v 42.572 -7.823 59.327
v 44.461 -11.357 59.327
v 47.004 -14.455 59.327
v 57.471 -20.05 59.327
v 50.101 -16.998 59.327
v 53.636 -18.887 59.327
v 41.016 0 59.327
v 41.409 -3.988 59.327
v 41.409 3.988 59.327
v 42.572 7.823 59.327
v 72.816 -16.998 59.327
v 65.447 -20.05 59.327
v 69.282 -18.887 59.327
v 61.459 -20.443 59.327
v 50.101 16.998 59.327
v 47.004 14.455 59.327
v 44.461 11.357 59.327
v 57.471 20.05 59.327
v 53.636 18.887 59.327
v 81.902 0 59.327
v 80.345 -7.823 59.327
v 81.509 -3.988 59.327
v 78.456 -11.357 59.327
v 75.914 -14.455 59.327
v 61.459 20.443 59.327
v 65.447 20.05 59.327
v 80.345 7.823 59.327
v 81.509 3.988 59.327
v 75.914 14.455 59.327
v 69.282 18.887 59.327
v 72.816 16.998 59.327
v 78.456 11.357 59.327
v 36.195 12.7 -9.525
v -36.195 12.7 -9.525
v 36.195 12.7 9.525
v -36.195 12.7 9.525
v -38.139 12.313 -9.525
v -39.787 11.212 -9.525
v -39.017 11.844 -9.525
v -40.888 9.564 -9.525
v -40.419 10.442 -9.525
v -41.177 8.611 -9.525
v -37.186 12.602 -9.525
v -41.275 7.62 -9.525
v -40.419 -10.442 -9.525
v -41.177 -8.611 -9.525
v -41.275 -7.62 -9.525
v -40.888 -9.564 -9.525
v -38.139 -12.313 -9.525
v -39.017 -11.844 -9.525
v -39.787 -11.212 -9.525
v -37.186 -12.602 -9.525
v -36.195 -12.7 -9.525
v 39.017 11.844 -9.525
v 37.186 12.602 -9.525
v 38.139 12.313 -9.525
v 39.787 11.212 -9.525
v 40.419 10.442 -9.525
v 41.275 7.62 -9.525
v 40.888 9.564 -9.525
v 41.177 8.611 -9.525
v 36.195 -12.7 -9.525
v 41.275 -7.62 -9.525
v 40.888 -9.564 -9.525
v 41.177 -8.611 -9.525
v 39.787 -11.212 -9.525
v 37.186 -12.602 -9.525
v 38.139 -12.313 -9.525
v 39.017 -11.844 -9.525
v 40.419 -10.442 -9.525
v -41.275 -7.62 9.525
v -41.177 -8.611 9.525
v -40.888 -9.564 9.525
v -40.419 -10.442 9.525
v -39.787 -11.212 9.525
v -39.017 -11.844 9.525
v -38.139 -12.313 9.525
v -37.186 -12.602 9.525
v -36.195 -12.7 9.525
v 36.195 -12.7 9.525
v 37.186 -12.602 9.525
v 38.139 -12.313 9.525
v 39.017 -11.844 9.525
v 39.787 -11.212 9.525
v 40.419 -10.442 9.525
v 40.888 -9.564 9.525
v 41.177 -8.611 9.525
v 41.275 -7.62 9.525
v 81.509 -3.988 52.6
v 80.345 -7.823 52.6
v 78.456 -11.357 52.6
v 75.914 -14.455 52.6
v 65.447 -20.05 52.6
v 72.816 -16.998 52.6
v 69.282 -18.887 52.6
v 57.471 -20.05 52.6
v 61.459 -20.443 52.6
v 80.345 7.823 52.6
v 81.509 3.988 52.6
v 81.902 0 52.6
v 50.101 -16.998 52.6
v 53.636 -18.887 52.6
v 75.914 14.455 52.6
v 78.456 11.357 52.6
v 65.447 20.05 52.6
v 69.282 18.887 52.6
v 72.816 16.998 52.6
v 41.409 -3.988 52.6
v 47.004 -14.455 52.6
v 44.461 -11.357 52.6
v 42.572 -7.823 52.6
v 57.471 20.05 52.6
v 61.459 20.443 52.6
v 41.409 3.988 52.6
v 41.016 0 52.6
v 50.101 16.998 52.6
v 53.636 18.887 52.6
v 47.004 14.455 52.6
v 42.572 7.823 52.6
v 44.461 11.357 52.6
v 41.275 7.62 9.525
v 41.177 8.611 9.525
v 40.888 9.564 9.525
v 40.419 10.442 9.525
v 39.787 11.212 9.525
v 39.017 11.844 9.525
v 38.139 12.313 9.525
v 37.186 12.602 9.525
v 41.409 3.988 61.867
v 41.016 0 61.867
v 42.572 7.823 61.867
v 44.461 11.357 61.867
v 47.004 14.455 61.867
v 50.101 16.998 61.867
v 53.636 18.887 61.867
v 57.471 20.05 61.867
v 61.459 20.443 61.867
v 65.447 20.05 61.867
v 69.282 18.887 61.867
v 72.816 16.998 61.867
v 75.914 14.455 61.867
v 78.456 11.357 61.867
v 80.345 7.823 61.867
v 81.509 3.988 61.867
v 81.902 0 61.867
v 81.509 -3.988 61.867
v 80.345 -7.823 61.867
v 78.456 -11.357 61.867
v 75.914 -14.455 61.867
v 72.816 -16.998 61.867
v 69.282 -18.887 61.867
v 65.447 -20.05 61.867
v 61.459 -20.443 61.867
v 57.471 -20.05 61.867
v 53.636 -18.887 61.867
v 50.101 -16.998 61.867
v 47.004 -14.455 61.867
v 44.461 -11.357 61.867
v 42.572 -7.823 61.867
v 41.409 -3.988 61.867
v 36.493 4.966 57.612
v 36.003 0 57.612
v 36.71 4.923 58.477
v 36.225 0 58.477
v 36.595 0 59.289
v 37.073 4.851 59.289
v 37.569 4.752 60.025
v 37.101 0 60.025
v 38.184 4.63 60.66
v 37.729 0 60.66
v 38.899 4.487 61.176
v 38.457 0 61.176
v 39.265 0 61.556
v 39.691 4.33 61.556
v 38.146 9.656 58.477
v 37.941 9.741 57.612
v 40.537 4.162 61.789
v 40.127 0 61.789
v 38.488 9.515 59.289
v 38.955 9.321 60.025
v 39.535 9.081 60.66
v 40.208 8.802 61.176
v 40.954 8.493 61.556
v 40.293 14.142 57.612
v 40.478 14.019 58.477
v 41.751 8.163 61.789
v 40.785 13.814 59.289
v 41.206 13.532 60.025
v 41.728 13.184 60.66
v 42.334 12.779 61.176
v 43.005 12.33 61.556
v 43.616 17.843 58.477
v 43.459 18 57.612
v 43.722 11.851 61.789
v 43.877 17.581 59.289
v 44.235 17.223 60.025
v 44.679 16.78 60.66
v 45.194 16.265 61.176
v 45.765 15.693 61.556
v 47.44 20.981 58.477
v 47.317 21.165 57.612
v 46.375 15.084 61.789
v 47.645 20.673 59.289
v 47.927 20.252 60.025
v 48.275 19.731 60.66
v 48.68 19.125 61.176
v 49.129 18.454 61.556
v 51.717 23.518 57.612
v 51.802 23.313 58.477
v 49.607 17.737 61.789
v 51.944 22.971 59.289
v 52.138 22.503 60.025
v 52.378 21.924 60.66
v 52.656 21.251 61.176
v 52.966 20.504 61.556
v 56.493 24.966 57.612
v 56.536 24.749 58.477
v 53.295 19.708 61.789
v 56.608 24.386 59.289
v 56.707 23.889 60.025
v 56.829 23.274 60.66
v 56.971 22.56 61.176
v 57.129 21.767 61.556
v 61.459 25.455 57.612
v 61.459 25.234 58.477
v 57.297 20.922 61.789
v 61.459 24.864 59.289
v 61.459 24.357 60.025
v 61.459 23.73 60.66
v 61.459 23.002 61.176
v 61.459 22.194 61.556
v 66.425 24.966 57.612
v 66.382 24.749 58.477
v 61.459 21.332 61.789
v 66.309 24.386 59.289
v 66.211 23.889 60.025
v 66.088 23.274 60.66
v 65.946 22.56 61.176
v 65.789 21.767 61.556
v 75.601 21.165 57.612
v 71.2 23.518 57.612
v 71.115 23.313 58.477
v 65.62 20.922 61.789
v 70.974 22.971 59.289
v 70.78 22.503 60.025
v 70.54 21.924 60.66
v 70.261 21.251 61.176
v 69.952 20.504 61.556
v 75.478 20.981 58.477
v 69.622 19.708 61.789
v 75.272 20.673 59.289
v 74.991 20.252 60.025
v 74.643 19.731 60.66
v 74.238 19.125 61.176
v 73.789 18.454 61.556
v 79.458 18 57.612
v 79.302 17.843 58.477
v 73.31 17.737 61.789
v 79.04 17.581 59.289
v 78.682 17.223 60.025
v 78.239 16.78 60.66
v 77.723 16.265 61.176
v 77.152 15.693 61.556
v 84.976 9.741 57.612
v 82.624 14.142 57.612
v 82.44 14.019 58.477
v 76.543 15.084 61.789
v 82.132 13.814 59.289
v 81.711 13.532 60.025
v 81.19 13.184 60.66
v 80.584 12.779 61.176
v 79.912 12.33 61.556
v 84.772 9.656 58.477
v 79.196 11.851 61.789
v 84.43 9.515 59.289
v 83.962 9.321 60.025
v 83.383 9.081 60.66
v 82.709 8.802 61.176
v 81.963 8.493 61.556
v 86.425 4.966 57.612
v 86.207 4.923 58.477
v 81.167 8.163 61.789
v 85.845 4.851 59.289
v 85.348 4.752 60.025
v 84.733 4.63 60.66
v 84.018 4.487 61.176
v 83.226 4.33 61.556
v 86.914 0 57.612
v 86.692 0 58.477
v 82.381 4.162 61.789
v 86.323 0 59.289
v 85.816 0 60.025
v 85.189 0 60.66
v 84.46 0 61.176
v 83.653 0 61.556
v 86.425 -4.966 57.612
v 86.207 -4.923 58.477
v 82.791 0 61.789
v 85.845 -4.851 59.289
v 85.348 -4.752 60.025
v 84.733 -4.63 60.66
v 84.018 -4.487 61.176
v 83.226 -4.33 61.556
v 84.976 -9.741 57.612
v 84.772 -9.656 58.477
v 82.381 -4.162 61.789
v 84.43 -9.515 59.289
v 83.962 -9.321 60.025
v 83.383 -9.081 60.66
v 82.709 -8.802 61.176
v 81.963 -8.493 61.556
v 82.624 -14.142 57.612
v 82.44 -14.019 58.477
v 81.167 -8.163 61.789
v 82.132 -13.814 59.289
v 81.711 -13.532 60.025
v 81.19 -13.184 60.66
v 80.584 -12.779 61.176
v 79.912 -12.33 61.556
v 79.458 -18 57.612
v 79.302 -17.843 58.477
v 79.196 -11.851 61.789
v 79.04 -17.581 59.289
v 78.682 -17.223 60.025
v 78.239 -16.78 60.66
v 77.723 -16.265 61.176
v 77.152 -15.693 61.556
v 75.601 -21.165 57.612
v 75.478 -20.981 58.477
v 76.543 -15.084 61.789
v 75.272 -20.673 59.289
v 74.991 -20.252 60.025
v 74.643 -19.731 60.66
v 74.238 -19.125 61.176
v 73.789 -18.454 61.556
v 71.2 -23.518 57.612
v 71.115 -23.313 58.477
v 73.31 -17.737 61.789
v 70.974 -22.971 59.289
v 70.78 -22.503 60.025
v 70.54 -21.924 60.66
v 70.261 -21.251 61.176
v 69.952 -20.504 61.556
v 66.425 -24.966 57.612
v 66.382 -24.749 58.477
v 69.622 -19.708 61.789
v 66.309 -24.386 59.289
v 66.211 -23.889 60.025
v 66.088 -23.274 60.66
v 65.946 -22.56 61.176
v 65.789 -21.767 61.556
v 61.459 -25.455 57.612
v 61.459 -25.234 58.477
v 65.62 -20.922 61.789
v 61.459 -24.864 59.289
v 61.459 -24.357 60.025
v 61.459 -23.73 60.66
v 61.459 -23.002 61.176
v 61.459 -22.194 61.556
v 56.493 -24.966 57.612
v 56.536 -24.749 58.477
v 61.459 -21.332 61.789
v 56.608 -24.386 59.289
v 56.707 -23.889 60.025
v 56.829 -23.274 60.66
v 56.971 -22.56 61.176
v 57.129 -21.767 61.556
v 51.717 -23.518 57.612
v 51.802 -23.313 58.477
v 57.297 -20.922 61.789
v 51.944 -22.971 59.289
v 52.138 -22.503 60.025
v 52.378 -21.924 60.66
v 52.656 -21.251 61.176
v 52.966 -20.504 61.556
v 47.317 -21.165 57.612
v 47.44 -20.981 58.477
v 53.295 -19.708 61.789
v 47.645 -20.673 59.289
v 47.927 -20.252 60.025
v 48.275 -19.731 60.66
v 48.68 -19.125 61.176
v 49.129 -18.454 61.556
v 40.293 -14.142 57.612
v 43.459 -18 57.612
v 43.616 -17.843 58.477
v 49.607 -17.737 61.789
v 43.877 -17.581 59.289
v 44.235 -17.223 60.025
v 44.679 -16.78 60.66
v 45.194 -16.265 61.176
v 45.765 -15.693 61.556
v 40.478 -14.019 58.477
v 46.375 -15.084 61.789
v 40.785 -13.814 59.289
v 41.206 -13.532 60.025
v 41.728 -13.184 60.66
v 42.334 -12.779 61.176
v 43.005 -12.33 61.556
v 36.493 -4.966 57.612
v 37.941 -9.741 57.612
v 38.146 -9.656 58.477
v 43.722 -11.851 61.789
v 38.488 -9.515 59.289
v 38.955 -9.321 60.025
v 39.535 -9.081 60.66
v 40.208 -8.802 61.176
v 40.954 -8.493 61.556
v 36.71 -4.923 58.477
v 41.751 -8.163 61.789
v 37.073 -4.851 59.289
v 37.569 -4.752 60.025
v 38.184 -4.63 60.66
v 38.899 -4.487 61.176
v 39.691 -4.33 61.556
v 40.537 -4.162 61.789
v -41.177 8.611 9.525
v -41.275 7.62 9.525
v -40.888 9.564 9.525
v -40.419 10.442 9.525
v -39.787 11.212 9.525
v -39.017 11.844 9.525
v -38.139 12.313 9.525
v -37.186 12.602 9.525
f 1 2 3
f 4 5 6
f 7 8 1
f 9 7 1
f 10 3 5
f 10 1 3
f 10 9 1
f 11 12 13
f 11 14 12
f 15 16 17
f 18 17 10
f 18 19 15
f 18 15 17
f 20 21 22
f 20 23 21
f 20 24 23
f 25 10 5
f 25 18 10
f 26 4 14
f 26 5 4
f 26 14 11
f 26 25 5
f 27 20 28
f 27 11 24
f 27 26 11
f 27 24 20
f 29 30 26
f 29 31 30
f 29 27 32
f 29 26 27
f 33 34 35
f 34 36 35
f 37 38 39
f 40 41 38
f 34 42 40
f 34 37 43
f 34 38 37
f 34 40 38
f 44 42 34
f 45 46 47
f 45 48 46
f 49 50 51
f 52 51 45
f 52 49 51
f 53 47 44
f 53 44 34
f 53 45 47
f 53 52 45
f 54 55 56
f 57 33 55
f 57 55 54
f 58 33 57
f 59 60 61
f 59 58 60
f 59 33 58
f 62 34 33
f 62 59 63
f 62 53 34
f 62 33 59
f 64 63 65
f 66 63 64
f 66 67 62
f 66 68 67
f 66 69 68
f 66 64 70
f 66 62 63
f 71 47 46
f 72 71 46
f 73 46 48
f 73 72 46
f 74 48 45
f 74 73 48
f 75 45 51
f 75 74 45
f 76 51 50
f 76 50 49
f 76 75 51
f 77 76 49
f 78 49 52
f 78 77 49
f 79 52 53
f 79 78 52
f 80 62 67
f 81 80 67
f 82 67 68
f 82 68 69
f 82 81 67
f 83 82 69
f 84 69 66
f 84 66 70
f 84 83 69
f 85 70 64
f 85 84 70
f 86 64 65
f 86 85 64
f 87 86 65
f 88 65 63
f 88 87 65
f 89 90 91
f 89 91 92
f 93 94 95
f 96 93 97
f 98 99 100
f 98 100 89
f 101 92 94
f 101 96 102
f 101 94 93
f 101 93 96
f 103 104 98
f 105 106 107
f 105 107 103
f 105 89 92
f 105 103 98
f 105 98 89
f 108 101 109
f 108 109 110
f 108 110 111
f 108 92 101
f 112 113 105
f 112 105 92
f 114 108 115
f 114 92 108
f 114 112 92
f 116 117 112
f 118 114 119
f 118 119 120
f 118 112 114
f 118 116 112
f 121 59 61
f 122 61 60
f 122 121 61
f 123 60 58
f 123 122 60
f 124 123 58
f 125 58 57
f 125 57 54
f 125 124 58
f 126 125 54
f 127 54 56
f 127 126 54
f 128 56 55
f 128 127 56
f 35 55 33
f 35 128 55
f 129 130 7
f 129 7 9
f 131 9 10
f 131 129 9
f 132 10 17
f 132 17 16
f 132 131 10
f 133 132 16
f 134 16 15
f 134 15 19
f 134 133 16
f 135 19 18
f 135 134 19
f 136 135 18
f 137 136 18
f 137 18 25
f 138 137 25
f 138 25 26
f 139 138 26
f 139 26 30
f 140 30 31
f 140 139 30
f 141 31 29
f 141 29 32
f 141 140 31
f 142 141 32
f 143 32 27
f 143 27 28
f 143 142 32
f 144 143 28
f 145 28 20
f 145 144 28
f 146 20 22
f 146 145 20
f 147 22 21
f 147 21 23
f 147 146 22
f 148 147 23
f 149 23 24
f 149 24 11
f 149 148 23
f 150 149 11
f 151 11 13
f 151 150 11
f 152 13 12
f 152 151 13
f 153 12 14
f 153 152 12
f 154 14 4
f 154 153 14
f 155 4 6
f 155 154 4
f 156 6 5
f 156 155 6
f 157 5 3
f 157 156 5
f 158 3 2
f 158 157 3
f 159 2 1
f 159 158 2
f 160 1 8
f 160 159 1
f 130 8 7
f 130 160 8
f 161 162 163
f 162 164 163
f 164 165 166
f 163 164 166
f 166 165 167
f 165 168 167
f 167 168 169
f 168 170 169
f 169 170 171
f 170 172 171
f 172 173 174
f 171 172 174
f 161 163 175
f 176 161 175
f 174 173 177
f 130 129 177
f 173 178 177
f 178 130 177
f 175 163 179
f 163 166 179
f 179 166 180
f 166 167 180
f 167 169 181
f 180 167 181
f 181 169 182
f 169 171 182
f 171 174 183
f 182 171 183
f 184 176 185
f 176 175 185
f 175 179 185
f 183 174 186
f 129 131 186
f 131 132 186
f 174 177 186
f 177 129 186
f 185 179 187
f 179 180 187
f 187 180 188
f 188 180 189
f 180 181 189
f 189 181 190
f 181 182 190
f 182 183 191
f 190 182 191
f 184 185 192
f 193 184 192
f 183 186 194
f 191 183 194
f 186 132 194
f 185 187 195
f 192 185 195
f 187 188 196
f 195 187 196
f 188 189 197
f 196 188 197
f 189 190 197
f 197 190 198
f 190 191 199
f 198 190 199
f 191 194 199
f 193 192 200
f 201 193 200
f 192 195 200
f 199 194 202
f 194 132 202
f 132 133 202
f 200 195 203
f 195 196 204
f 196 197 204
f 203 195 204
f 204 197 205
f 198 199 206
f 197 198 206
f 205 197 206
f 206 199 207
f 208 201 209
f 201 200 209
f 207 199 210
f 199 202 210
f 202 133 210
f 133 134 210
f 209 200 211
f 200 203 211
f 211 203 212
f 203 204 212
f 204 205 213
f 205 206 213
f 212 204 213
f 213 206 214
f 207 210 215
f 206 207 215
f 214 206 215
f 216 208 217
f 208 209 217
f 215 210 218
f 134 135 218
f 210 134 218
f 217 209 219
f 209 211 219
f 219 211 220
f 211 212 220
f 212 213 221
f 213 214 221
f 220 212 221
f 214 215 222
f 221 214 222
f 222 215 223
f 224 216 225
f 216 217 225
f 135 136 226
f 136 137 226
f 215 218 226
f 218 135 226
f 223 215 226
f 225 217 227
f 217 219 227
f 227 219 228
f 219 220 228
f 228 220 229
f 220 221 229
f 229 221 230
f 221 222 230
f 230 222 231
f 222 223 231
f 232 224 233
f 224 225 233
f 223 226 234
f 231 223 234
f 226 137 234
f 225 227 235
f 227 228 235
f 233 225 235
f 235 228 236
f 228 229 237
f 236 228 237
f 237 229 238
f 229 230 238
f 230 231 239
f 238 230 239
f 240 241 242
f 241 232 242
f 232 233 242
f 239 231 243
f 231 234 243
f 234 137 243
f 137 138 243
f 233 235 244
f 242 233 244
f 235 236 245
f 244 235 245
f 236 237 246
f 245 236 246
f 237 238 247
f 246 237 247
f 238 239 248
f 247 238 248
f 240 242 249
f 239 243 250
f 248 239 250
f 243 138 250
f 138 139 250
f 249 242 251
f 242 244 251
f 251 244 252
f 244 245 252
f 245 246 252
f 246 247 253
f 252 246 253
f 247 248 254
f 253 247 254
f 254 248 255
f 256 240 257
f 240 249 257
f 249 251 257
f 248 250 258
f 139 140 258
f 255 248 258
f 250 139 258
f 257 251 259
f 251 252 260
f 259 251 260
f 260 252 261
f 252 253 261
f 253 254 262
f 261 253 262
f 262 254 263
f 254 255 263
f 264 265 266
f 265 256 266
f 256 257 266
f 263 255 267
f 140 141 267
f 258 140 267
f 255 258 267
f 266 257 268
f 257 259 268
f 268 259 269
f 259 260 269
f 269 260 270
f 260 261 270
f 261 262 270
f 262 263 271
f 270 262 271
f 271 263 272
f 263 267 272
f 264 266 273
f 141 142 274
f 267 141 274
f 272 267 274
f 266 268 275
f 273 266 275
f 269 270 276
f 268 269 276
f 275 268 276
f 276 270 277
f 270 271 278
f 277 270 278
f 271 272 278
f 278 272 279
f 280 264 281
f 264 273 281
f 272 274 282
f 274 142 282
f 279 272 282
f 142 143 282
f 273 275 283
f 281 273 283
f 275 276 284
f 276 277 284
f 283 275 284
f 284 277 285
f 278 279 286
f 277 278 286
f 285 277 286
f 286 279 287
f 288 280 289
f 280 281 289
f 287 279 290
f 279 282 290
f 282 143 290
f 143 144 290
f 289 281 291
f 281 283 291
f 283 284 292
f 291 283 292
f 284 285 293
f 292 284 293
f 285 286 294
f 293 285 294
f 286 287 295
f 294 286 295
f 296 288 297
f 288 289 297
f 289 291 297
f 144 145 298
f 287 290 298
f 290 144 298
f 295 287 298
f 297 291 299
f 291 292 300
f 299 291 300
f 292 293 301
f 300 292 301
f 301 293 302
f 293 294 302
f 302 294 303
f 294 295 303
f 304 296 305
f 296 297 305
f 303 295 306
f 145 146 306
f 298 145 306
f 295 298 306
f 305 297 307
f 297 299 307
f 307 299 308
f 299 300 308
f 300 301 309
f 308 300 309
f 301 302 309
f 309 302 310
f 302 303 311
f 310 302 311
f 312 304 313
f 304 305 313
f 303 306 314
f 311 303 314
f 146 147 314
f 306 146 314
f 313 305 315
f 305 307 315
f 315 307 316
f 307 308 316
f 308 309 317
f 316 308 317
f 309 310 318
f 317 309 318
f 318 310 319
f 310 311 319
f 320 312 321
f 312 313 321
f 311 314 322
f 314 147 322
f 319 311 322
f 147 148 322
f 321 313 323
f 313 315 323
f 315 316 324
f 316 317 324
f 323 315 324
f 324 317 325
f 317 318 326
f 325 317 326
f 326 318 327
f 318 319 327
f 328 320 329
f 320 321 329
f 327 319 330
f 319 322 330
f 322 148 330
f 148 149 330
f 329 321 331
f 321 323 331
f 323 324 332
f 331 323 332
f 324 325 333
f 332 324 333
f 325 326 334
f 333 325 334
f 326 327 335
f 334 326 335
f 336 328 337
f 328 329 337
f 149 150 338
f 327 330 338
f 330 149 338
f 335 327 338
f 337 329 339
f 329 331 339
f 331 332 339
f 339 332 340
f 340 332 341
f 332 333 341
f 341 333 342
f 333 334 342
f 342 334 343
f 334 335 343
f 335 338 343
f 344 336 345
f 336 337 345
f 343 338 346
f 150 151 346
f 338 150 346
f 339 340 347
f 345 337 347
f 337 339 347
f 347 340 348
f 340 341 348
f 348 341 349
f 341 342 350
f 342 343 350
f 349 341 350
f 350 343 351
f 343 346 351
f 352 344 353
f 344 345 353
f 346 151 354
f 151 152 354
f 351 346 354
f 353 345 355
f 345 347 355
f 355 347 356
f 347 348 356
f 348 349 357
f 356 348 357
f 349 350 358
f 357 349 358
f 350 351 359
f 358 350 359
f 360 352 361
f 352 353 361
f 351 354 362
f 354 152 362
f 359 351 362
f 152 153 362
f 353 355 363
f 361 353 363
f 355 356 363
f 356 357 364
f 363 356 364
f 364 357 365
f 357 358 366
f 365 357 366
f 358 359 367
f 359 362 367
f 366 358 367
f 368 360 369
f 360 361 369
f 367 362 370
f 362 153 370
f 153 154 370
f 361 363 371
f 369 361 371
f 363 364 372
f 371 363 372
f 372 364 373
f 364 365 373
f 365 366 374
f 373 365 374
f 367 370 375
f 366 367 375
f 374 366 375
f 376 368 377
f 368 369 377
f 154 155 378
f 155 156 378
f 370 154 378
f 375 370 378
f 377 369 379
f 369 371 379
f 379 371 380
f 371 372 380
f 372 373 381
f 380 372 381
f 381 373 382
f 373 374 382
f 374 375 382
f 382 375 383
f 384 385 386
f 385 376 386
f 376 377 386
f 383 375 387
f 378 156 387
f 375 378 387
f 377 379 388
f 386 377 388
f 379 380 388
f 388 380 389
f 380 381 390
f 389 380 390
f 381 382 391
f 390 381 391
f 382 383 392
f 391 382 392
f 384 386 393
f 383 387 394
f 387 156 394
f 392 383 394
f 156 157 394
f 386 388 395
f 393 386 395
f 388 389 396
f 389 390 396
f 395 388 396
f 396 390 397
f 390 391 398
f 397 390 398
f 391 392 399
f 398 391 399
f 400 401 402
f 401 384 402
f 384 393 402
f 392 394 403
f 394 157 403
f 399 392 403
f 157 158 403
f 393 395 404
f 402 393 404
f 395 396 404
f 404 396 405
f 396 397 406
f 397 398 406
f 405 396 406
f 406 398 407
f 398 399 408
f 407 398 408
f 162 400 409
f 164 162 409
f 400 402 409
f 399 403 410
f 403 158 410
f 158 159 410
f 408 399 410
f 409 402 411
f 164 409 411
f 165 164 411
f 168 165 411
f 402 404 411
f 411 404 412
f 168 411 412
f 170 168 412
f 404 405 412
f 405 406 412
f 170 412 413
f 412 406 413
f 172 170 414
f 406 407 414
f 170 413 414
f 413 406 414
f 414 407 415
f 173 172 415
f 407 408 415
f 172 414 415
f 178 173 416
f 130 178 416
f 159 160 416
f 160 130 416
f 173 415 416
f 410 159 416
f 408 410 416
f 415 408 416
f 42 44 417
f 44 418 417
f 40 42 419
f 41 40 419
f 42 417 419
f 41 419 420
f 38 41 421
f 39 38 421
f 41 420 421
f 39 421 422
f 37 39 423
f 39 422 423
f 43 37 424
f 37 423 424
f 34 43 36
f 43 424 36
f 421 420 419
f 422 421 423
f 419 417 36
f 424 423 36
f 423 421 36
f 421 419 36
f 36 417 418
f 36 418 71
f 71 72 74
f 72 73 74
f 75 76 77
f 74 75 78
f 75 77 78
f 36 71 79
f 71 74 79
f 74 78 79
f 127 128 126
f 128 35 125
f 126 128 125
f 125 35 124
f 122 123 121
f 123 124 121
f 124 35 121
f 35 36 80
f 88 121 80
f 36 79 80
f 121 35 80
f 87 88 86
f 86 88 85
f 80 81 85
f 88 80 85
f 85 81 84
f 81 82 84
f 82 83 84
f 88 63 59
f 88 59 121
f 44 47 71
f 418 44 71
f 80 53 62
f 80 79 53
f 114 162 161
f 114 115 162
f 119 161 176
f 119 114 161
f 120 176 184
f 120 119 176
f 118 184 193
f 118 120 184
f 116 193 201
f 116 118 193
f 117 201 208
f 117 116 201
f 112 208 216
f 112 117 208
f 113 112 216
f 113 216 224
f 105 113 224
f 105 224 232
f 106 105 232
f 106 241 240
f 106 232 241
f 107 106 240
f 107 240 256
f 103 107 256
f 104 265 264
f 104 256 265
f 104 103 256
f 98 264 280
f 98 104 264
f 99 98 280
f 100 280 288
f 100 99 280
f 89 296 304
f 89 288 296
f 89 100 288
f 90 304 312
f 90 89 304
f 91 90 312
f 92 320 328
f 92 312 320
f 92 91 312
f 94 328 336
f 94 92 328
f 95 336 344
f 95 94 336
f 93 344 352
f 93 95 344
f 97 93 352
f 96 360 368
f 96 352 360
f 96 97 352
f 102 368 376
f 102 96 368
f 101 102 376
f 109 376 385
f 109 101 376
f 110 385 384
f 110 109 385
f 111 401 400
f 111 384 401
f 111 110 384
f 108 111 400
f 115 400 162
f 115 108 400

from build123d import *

# Parameters (mm, degrees)
F0_W     = 82.55
F0_H     = 19.05
F1_DEPTH = 12.7
F3_R     = 5.08
F4_R     = 5.08
F6_DEPTH = 2.54


# Not quite as in the source:
# - a fillet or chamfer that OpenCascade refuses, or shapes differently, is made with other operations: its cross-section is extruded or revolved along the edge and cut away or added


with BuildPart() as f1:
    # F0 (on Front) → F1 (new body, symmetric)
    with BuildSketch(Plane.XZ):
        Rectangle(F0_W, F0_H)
    extrude(amount=F1_DEPTH, both=True)

    # F3
    f3_edges = [f1.edges().sort_by_distance(p)[0] for p in [
        (-41.275, -12.7, 0),
        (41.275, -12.7, 0),
        (41.275, 12.7, 0),
        (-41.275, 12.7, 0),
    ]]
    fillet(f3_edges, radius=F3_R)


with BuildPart() as f2:
    # F0 (on Front) → F2 (revolve)
    with BuildSketch(Plane.XZ):
        Polygon((35.9360538423, 61.8671737611), (35.9360538423, 52.5995560322), (50.8114657512, 52.5995560322), (61.4588148892, 52.5995560322), (61.4588148892, 61.8671737611), align=None)
    revolve(axis=Axis((61.4588148892, 0, 54.2103461921), (0, 0, -1)))

    # F4
    f4_edges = [f2.edges().sort_by_distance(p)[0] for p in [
        (86.981576, 0, 61.867174),
    ]]
    fillet(f4_edges, radius=F4_R)

    # F5: chamfer of 5.08 on 1 edges, made by hand

    # F5_s1 → F5_t2 (revolve, cut)
    with BuildSketch(Plane.XZ):
        Polygon((35.9360538423, 57.6795560322), (41.0160538423, 52.5995560322), (35.9360538423, 52.5995560322), align=None)
    revolve(axis=Axis((61.4588148892, 0, 52.5995560322), (0, 0, -1)), mode=Mode.SUBTRACT)

    # F6 (cut): a face of the model
    f6_faces = [f2.faces().sort_by_distance(p)[0] for p in [
        (61.4588148892, 0, 61.8671737611),
    ]]
    extrude(f6_faces, amount=-F6_DEPTH, mode=Mode.SUBTRACT)


solid = Compound([f1.part, f2.part])
